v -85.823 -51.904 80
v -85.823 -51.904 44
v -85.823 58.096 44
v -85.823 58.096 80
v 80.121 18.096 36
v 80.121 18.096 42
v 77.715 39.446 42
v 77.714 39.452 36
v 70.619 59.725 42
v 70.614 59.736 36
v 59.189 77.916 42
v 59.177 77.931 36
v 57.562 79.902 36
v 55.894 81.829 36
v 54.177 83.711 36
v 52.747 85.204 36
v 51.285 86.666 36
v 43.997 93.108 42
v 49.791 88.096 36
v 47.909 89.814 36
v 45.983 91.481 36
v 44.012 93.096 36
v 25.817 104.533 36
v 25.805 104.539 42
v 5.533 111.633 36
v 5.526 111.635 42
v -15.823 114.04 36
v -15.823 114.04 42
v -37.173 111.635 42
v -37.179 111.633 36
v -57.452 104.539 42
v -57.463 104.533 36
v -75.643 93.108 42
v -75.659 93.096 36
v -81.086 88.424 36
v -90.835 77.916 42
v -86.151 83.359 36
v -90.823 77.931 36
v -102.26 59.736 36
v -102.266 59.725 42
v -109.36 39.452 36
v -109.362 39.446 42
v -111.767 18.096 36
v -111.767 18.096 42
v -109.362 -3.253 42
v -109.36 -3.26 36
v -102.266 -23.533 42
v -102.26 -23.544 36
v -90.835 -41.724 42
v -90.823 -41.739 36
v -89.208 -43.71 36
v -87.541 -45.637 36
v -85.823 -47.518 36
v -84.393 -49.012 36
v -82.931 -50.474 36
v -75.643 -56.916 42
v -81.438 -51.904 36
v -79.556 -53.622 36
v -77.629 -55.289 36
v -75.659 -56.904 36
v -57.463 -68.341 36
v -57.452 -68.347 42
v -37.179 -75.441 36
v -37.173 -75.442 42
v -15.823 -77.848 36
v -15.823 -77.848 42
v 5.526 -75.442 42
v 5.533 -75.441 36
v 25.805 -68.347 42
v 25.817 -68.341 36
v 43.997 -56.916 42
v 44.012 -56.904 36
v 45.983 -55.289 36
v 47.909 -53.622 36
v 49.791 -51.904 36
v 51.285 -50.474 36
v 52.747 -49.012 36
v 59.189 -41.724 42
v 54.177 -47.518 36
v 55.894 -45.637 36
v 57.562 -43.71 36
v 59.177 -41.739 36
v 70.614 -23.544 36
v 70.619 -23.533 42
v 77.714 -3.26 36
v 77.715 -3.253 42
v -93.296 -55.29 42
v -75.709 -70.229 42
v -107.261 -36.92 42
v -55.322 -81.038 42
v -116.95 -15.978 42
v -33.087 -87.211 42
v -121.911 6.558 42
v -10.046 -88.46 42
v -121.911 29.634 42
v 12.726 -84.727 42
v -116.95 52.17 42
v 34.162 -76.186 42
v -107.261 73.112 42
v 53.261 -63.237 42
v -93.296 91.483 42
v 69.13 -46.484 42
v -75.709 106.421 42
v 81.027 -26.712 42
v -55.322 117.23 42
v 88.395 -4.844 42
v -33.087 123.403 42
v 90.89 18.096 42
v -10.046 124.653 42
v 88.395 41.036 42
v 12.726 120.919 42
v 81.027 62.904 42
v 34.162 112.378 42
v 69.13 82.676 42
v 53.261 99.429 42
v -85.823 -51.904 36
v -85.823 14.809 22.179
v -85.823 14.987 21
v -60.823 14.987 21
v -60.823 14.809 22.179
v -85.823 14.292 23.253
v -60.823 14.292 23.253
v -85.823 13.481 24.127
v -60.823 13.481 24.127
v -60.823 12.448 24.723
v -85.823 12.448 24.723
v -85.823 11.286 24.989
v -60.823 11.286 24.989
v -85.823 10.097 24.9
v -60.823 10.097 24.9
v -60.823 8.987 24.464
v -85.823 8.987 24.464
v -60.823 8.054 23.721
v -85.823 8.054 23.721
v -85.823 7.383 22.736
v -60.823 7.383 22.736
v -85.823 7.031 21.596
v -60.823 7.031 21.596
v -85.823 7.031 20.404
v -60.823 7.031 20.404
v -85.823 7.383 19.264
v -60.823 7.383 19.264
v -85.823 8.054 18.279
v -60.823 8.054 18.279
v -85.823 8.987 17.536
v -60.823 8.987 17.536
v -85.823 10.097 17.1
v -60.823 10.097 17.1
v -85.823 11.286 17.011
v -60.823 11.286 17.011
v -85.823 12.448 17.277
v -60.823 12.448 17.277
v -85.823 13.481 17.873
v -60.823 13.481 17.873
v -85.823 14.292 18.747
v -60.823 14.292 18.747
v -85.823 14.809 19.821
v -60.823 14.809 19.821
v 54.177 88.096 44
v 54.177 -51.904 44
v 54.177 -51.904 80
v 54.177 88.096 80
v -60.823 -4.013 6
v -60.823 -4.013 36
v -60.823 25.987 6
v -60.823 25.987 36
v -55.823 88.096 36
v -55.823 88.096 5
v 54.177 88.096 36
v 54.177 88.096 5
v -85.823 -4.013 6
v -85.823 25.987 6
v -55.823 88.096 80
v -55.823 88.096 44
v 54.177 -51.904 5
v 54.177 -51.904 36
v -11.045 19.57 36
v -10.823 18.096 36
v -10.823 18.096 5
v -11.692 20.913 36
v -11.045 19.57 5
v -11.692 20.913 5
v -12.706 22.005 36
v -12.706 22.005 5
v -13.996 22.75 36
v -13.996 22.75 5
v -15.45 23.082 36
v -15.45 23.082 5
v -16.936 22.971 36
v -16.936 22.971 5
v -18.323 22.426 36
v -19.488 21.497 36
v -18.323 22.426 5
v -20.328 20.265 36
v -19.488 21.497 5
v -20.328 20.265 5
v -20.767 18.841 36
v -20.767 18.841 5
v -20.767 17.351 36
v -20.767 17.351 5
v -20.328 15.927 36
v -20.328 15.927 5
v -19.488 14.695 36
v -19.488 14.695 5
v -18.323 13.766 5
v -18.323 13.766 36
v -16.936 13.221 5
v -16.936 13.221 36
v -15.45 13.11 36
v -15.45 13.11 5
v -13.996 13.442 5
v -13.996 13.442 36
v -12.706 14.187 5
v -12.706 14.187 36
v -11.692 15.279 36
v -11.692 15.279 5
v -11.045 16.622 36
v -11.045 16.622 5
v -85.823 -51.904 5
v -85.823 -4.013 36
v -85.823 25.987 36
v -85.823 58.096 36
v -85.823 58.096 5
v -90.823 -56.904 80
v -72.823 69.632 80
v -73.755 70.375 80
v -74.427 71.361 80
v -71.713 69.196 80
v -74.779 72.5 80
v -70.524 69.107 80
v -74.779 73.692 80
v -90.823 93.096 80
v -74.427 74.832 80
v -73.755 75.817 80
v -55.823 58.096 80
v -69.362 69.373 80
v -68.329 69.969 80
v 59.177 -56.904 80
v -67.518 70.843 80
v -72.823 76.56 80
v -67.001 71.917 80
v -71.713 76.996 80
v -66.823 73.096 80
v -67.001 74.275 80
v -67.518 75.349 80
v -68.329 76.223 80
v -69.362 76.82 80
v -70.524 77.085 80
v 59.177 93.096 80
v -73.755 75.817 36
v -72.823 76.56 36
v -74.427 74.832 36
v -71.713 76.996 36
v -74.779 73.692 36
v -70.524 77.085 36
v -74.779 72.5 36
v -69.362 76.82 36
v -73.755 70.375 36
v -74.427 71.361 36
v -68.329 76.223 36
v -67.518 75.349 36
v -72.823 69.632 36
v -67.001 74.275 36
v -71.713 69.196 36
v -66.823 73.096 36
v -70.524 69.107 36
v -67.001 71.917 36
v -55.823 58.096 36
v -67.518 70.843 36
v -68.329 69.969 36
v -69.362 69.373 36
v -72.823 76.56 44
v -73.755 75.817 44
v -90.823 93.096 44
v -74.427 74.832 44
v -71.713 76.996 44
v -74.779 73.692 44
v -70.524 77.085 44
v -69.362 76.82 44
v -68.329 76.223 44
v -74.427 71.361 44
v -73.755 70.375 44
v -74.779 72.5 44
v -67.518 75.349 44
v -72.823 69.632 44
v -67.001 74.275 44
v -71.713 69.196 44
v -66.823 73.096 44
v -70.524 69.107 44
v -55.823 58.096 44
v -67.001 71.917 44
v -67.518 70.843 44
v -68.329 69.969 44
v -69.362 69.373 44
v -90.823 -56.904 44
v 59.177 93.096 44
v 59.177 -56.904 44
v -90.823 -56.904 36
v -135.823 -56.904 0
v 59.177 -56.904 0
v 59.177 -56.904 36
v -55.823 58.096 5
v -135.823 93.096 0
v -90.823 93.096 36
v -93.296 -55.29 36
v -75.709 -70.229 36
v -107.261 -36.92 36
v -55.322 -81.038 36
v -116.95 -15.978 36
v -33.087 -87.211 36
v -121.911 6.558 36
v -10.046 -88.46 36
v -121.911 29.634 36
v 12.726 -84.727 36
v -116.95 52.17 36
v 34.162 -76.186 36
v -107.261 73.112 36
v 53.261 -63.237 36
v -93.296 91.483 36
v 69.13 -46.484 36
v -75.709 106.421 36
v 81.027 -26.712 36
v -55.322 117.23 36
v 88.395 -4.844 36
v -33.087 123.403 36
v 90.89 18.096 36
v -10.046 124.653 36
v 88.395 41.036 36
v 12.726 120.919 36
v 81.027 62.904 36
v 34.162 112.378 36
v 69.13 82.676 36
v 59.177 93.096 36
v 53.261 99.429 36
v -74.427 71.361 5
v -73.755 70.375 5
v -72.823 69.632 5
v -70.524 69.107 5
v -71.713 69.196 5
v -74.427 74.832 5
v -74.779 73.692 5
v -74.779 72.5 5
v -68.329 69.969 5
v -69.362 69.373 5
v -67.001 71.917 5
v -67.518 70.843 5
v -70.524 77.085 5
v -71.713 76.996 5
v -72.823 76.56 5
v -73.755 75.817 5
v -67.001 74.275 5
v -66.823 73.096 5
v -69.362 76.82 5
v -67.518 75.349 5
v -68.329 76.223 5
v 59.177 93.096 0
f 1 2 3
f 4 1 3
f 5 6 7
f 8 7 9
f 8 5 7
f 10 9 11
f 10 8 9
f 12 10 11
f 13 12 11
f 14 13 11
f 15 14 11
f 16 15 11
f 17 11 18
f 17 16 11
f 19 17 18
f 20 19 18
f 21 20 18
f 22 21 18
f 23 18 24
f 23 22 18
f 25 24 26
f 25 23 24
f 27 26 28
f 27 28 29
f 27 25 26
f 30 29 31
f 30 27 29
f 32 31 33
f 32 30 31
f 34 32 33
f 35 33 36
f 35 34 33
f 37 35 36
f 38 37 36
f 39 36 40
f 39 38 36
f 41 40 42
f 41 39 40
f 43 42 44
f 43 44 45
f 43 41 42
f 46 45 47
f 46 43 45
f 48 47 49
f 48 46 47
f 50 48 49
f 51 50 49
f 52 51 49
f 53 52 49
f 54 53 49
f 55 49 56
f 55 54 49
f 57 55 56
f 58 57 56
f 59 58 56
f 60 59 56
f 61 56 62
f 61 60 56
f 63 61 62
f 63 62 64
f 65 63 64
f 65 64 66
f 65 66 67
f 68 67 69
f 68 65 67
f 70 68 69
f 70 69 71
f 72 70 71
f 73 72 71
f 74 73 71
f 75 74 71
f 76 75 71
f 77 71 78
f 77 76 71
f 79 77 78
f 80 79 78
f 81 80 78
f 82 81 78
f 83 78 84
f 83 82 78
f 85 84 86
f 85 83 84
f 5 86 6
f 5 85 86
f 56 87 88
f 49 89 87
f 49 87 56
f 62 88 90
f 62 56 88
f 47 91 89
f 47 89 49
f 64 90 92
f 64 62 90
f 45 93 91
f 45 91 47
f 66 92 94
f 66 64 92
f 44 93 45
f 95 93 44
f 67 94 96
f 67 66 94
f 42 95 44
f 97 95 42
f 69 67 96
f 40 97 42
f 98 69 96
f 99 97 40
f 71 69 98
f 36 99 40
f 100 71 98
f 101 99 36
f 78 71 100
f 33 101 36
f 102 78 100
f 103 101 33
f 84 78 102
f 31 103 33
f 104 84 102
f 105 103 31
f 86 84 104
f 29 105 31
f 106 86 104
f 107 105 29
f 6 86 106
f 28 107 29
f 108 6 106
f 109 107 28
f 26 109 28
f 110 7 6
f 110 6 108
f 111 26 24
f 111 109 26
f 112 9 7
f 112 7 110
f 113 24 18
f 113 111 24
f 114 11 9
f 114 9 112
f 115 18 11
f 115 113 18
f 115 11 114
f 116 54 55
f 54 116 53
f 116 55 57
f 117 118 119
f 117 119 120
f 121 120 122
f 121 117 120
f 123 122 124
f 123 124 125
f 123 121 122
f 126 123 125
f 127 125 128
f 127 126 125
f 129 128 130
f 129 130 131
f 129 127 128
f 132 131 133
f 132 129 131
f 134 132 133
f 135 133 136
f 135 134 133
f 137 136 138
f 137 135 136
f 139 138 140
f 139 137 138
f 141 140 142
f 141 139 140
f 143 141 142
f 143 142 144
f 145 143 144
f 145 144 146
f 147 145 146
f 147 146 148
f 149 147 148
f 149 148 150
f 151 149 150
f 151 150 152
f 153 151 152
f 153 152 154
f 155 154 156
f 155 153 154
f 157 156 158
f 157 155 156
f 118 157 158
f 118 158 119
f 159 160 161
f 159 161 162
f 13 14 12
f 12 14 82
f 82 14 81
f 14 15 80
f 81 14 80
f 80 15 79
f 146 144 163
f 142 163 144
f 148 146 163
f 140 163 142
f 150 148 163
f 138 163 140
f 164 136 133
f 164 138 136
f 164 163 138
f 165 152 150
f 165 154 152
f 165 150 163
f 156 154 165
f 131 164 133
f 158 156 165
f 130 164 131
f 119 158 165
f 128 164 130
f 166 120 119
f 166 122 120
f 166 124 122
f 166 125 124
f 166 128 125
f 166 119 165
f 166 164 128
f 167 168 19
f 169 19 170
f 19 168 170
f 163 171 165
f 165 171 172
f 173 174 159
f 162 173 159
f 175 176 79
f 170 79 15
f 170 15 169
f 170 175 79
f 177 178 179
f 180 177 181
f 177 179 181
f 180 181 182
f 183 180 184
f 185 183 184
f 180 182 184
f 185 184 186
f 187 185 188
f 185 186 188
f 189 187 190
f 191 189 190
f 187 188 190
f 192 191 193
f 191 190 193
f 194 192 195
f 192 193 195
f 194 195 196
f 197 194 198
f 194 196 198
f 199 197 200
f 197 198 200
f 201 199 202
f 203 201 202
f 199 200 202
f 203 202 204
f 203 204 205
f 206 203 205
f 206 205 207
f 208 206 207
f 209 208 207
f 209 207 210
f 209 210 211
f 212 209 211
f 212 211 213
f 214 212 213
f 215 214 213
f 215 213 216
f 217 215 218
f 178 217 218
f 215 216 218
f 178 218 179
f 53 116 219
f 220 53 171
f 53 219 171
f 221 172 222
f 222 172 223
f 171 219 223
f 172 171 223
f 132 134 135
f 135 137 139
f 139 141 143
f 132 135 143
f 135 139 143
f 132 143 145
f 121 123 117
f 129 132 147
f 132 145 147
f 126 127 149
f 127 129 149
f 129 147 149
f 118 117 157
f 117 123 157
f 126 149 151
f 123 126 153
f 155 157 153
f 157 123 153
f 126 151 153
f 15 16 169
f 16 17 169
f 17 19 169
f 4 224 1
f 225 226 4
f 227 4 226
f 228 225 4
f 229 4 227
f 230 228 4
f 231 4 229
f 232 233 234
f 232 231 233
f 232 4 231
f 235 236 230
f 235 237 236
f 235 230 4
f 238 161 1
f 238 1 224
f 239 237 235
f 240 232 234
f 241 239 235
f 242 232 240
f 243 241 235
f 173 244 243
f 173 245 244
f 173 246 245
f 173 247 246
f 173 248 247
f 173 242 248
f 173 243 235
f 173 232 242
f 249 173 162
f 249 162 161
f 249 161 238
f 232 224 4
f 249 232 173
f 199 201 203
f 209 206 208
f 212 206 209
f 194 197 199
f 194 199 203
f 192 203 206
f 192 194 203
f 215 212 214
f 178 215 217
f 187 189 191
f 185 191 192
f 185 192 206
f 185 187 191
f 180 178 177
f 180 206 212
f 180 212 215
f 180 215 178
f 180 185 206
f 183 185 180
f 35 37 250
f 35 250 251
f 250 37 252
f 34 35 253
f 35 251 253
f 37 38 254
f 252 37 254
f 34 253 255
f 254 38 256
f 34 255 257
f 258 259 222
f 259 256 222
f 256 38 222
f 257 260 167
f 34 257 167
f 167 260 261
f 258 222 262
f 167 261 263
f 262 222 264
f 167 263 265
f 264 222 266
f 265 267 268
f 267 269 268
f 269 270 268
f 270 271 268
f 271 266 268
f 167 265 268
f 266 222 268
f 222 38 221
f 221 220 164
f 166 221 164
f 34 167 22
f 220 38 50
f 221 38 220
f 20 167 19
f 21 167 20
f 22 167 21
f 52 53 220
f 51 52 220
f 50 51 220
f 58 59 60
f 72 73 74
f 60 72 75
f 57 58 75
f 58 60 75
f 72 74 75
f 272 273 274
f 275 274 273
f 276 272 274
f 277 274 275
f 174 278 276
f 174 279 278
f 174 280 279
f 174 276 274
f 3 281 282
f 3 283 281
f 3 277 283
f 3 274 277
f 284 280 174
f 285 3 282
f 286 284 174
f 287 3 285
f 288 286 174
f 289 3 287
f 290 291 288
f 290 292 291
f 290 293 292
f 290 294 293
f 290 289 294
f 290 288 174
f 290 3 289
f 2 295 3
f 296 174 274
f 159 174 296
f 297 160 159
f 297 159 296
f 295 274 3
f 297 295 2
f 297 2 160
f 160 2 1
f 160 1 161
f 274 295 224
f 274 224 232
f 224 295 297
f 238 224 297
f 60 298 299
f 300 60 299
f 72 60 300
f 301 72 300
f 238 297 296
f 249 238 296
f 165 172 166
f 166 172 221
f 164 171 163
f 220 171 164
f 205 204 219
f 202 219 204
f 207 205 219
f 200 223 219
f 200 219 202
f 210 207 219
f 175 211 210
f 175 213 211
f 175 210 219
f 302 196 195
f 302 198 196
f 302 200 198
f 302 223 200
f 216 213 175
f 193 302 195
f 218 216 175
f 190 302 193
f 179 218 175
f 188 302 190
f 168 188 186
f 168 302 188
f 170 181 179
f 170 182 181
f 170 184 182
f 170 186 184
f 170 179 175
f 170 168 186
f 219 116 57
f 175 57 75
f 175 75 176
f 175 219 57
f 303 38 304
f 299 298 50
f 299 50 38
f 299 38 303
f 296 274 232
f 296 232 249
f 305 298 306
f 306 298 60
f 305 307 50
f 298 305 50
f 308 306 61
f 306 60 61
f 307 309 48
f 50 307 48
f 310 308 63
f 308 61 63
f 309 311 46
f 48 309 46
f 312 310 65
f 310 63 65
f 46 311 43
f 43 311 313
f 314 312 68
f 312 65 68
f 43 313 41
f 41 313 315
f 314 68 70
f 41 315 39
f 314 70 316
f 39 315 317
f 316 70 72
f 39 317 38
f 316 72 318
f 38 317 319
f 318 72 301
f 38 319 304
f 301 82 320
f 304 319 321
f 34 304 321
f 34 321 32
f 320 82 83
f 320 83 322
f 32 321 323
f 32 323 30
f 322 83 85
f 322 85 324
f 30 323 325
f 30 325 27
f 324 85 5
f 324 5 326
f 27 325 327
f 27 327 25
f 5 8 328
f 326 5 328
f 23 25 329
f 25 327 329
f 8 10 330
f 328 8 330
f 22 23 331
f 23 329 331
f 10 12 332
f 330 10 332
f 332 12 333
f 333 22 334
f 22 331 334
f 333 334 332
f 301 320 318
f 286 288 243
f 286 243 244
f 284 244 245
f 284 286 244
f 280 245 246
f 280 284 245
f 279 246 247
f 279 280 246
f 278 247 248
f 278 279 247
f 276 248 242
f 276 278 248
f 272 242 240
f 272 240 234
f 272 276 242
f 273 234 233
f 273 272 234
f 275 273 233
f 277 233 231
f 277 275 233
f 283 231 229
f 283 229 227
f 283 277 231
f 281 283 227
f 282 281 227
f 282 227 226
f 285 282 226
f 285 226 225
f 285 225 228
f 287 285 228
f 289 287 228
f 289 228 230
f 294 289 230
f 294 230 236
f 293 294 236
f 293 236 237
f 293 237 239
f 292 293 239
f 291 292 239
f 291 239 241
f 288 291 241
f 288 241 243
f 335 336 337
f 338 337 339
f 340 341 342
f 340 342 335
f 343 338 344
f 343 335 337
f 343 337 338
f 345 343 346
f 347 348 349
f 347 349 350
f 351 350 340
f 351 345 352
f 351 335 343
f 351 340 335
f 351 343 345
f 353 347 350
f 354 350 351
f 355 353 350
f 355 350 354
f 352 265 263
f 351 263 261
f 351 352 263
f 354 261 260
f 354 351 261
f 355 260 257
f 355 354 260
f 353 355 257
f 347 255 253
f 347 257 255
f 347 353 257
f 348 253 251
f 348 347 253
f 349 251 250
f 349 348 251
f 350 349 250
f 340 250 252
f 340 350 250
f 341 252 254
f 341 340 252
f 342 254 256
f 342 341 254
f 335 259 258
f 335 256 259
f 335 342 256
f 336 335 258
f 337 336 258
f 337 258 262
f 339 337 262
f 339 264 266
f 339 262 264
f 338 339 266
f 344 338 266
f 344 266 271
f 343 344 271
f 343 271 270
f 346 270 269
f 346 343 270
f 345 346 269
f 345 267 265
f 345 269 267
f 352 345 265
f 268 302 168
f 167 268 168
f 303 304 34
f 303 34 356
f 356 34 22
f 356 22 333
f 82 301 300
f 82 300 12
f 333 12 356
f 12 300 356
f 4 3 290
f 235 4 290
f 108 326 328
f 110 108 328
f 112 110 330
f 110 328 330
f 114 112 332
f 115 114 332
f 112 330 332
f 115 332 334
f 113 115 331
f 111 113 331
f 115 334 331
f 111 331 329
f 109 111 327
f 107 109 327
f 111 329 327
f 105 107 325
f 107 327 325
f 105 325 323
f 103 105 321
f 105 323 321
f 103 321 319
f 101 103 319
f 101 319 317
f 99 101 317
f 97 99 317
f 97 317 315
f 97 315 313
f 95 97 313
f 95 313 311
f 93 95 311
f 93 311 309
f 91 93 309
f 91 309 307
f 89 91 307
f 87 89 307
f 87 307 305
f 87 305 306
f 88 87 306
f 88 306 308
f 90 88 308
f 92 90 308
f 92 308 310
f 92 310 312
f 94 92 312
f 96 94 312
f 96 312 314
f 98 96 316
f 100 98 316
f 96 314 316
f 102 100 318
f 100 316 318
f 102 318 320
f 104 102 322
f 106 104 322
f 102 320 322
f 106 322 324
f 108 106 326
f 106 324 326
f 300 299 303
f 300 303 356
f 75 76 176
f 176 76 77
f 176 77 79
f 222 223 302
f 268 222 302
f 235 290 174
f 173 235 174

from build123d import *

# Parameters (mm, degrees)
F0_W      = 150
F0_H      = 150
F1_DEPTH  = 80
F2_T      = -5
F3_W      = 30
F3_H      = 30
F3_R      = 4
F4_DEPTH  = 75
F5_W      = 150
F5_H      = 8
F6_DEPTH  = 150
F8_W      = 30
F8_H      = 30
F8_R      = 4
F9_DEPTH  = 25
F11_DEPTH = 150
F12_R     = 5
F13_DEPTH = 31
F14_R     = 106.712960112
F14_R_2   = 95.94407307
F15_DEPTH = 6
F16_DEPTH = 1
F17_DEPTH = 2


with BuildPart() as f1:
    # F0 (on Top) → F1 (new body)
    with BuildSketch(Plane.XY):
        with Locations((-15.8231919576, 18.09606608)):
            Rectangle(F0_W, F0_H)
    extrude(amount=F1_DEPTH)

    # F2
    f2_openings = [f1.faces().sort_by_distance(p)[0] for p in [
        (-15.823192, 18.096066, 80),
    ]]
    offset(amount=F2_T, openings=f2_openings)

    # F3 (on face) → F4 (join)
    with BuildSketch(Plane.XY.offset(5)):
        with Locations((-70.8231919576, 73.09606608)):
            Rectangle(F3_W, F3_H)
        with Locations((-70.8231919576, 73.09606608)):
            Circle(F3_R, mode=Mode.SUBTRACT)
    extrude(amount=F4_DEPTH)

    # F5 (on face) → F6 (cut)
    with BuildSketch(Plane.XZ.offset(56.90393392)):
        with Locations((-15.8231919576, 40)):
            Rectangle(F5_W, F5_H)
    extrude(amount=-F6_DEPTH, mode=Mode.SUBTRACT)

    # F8 (on face) → F9 (join)
    with BuildSketch(Plane.YZ.offset(-85.8231919576)):
        with Locations((10.9866525605, 21)):
            Rectangle(F8_W, F8_H)
        with Locations((10.9866525605, 21)):
            Circle(F8_R, mode=Mode.SUBTRACT)
    extrude(amount=F9_DEPTH)

    # F10 (on face) → F11 (join)
    with BuildSketch(Plane.XZ.offset(56.90393392)):
        Polygon((-135.8231919576, 0), (-90.8231919576, 0), (-90.8231919576, 36), align=None)
    extrude(amount=-F11_DEPTH)

    # F12 (on face) → F13 (join)
    with BuildSketch(Plane.XY.offset(5)):
        with Locations((-15.8231919576, 18.09606608)):
            Circle(F12_R)
    extrude(amount=F13_DEPTH)

    # F14 (on face) → F15 (join)
    with BuildSketch(Plane.XY.offset(36)):
        with Locations((-15.8231919576, 18.09606608)):
            Circle(F14_R)
        with Locations((-15.8231919576, 18.09606608)):
            Circle(F14_R_2, mode=Mode.SUBTRACT)
    extrude(amount=F15_DEPTH)

    # F16 (add): a face of the model
    f16_faces = [f1.faces().sort_by_distance(p)[0] for p in [
        (-119.5178537602, 18.09606608, 36),
    ]]
    extrude(f16_faces, amount=-F16_DEPTH)

    # F17 (add): a face of the model
    f17_faces = [f1.faces().sort_by_distance(p)[0] for p in [
        (-119.5178537602, 18.09606608, 36),
    ]]
    extrude(f17_faces, amount=-F17_DEPTH)


solid = f1.part
